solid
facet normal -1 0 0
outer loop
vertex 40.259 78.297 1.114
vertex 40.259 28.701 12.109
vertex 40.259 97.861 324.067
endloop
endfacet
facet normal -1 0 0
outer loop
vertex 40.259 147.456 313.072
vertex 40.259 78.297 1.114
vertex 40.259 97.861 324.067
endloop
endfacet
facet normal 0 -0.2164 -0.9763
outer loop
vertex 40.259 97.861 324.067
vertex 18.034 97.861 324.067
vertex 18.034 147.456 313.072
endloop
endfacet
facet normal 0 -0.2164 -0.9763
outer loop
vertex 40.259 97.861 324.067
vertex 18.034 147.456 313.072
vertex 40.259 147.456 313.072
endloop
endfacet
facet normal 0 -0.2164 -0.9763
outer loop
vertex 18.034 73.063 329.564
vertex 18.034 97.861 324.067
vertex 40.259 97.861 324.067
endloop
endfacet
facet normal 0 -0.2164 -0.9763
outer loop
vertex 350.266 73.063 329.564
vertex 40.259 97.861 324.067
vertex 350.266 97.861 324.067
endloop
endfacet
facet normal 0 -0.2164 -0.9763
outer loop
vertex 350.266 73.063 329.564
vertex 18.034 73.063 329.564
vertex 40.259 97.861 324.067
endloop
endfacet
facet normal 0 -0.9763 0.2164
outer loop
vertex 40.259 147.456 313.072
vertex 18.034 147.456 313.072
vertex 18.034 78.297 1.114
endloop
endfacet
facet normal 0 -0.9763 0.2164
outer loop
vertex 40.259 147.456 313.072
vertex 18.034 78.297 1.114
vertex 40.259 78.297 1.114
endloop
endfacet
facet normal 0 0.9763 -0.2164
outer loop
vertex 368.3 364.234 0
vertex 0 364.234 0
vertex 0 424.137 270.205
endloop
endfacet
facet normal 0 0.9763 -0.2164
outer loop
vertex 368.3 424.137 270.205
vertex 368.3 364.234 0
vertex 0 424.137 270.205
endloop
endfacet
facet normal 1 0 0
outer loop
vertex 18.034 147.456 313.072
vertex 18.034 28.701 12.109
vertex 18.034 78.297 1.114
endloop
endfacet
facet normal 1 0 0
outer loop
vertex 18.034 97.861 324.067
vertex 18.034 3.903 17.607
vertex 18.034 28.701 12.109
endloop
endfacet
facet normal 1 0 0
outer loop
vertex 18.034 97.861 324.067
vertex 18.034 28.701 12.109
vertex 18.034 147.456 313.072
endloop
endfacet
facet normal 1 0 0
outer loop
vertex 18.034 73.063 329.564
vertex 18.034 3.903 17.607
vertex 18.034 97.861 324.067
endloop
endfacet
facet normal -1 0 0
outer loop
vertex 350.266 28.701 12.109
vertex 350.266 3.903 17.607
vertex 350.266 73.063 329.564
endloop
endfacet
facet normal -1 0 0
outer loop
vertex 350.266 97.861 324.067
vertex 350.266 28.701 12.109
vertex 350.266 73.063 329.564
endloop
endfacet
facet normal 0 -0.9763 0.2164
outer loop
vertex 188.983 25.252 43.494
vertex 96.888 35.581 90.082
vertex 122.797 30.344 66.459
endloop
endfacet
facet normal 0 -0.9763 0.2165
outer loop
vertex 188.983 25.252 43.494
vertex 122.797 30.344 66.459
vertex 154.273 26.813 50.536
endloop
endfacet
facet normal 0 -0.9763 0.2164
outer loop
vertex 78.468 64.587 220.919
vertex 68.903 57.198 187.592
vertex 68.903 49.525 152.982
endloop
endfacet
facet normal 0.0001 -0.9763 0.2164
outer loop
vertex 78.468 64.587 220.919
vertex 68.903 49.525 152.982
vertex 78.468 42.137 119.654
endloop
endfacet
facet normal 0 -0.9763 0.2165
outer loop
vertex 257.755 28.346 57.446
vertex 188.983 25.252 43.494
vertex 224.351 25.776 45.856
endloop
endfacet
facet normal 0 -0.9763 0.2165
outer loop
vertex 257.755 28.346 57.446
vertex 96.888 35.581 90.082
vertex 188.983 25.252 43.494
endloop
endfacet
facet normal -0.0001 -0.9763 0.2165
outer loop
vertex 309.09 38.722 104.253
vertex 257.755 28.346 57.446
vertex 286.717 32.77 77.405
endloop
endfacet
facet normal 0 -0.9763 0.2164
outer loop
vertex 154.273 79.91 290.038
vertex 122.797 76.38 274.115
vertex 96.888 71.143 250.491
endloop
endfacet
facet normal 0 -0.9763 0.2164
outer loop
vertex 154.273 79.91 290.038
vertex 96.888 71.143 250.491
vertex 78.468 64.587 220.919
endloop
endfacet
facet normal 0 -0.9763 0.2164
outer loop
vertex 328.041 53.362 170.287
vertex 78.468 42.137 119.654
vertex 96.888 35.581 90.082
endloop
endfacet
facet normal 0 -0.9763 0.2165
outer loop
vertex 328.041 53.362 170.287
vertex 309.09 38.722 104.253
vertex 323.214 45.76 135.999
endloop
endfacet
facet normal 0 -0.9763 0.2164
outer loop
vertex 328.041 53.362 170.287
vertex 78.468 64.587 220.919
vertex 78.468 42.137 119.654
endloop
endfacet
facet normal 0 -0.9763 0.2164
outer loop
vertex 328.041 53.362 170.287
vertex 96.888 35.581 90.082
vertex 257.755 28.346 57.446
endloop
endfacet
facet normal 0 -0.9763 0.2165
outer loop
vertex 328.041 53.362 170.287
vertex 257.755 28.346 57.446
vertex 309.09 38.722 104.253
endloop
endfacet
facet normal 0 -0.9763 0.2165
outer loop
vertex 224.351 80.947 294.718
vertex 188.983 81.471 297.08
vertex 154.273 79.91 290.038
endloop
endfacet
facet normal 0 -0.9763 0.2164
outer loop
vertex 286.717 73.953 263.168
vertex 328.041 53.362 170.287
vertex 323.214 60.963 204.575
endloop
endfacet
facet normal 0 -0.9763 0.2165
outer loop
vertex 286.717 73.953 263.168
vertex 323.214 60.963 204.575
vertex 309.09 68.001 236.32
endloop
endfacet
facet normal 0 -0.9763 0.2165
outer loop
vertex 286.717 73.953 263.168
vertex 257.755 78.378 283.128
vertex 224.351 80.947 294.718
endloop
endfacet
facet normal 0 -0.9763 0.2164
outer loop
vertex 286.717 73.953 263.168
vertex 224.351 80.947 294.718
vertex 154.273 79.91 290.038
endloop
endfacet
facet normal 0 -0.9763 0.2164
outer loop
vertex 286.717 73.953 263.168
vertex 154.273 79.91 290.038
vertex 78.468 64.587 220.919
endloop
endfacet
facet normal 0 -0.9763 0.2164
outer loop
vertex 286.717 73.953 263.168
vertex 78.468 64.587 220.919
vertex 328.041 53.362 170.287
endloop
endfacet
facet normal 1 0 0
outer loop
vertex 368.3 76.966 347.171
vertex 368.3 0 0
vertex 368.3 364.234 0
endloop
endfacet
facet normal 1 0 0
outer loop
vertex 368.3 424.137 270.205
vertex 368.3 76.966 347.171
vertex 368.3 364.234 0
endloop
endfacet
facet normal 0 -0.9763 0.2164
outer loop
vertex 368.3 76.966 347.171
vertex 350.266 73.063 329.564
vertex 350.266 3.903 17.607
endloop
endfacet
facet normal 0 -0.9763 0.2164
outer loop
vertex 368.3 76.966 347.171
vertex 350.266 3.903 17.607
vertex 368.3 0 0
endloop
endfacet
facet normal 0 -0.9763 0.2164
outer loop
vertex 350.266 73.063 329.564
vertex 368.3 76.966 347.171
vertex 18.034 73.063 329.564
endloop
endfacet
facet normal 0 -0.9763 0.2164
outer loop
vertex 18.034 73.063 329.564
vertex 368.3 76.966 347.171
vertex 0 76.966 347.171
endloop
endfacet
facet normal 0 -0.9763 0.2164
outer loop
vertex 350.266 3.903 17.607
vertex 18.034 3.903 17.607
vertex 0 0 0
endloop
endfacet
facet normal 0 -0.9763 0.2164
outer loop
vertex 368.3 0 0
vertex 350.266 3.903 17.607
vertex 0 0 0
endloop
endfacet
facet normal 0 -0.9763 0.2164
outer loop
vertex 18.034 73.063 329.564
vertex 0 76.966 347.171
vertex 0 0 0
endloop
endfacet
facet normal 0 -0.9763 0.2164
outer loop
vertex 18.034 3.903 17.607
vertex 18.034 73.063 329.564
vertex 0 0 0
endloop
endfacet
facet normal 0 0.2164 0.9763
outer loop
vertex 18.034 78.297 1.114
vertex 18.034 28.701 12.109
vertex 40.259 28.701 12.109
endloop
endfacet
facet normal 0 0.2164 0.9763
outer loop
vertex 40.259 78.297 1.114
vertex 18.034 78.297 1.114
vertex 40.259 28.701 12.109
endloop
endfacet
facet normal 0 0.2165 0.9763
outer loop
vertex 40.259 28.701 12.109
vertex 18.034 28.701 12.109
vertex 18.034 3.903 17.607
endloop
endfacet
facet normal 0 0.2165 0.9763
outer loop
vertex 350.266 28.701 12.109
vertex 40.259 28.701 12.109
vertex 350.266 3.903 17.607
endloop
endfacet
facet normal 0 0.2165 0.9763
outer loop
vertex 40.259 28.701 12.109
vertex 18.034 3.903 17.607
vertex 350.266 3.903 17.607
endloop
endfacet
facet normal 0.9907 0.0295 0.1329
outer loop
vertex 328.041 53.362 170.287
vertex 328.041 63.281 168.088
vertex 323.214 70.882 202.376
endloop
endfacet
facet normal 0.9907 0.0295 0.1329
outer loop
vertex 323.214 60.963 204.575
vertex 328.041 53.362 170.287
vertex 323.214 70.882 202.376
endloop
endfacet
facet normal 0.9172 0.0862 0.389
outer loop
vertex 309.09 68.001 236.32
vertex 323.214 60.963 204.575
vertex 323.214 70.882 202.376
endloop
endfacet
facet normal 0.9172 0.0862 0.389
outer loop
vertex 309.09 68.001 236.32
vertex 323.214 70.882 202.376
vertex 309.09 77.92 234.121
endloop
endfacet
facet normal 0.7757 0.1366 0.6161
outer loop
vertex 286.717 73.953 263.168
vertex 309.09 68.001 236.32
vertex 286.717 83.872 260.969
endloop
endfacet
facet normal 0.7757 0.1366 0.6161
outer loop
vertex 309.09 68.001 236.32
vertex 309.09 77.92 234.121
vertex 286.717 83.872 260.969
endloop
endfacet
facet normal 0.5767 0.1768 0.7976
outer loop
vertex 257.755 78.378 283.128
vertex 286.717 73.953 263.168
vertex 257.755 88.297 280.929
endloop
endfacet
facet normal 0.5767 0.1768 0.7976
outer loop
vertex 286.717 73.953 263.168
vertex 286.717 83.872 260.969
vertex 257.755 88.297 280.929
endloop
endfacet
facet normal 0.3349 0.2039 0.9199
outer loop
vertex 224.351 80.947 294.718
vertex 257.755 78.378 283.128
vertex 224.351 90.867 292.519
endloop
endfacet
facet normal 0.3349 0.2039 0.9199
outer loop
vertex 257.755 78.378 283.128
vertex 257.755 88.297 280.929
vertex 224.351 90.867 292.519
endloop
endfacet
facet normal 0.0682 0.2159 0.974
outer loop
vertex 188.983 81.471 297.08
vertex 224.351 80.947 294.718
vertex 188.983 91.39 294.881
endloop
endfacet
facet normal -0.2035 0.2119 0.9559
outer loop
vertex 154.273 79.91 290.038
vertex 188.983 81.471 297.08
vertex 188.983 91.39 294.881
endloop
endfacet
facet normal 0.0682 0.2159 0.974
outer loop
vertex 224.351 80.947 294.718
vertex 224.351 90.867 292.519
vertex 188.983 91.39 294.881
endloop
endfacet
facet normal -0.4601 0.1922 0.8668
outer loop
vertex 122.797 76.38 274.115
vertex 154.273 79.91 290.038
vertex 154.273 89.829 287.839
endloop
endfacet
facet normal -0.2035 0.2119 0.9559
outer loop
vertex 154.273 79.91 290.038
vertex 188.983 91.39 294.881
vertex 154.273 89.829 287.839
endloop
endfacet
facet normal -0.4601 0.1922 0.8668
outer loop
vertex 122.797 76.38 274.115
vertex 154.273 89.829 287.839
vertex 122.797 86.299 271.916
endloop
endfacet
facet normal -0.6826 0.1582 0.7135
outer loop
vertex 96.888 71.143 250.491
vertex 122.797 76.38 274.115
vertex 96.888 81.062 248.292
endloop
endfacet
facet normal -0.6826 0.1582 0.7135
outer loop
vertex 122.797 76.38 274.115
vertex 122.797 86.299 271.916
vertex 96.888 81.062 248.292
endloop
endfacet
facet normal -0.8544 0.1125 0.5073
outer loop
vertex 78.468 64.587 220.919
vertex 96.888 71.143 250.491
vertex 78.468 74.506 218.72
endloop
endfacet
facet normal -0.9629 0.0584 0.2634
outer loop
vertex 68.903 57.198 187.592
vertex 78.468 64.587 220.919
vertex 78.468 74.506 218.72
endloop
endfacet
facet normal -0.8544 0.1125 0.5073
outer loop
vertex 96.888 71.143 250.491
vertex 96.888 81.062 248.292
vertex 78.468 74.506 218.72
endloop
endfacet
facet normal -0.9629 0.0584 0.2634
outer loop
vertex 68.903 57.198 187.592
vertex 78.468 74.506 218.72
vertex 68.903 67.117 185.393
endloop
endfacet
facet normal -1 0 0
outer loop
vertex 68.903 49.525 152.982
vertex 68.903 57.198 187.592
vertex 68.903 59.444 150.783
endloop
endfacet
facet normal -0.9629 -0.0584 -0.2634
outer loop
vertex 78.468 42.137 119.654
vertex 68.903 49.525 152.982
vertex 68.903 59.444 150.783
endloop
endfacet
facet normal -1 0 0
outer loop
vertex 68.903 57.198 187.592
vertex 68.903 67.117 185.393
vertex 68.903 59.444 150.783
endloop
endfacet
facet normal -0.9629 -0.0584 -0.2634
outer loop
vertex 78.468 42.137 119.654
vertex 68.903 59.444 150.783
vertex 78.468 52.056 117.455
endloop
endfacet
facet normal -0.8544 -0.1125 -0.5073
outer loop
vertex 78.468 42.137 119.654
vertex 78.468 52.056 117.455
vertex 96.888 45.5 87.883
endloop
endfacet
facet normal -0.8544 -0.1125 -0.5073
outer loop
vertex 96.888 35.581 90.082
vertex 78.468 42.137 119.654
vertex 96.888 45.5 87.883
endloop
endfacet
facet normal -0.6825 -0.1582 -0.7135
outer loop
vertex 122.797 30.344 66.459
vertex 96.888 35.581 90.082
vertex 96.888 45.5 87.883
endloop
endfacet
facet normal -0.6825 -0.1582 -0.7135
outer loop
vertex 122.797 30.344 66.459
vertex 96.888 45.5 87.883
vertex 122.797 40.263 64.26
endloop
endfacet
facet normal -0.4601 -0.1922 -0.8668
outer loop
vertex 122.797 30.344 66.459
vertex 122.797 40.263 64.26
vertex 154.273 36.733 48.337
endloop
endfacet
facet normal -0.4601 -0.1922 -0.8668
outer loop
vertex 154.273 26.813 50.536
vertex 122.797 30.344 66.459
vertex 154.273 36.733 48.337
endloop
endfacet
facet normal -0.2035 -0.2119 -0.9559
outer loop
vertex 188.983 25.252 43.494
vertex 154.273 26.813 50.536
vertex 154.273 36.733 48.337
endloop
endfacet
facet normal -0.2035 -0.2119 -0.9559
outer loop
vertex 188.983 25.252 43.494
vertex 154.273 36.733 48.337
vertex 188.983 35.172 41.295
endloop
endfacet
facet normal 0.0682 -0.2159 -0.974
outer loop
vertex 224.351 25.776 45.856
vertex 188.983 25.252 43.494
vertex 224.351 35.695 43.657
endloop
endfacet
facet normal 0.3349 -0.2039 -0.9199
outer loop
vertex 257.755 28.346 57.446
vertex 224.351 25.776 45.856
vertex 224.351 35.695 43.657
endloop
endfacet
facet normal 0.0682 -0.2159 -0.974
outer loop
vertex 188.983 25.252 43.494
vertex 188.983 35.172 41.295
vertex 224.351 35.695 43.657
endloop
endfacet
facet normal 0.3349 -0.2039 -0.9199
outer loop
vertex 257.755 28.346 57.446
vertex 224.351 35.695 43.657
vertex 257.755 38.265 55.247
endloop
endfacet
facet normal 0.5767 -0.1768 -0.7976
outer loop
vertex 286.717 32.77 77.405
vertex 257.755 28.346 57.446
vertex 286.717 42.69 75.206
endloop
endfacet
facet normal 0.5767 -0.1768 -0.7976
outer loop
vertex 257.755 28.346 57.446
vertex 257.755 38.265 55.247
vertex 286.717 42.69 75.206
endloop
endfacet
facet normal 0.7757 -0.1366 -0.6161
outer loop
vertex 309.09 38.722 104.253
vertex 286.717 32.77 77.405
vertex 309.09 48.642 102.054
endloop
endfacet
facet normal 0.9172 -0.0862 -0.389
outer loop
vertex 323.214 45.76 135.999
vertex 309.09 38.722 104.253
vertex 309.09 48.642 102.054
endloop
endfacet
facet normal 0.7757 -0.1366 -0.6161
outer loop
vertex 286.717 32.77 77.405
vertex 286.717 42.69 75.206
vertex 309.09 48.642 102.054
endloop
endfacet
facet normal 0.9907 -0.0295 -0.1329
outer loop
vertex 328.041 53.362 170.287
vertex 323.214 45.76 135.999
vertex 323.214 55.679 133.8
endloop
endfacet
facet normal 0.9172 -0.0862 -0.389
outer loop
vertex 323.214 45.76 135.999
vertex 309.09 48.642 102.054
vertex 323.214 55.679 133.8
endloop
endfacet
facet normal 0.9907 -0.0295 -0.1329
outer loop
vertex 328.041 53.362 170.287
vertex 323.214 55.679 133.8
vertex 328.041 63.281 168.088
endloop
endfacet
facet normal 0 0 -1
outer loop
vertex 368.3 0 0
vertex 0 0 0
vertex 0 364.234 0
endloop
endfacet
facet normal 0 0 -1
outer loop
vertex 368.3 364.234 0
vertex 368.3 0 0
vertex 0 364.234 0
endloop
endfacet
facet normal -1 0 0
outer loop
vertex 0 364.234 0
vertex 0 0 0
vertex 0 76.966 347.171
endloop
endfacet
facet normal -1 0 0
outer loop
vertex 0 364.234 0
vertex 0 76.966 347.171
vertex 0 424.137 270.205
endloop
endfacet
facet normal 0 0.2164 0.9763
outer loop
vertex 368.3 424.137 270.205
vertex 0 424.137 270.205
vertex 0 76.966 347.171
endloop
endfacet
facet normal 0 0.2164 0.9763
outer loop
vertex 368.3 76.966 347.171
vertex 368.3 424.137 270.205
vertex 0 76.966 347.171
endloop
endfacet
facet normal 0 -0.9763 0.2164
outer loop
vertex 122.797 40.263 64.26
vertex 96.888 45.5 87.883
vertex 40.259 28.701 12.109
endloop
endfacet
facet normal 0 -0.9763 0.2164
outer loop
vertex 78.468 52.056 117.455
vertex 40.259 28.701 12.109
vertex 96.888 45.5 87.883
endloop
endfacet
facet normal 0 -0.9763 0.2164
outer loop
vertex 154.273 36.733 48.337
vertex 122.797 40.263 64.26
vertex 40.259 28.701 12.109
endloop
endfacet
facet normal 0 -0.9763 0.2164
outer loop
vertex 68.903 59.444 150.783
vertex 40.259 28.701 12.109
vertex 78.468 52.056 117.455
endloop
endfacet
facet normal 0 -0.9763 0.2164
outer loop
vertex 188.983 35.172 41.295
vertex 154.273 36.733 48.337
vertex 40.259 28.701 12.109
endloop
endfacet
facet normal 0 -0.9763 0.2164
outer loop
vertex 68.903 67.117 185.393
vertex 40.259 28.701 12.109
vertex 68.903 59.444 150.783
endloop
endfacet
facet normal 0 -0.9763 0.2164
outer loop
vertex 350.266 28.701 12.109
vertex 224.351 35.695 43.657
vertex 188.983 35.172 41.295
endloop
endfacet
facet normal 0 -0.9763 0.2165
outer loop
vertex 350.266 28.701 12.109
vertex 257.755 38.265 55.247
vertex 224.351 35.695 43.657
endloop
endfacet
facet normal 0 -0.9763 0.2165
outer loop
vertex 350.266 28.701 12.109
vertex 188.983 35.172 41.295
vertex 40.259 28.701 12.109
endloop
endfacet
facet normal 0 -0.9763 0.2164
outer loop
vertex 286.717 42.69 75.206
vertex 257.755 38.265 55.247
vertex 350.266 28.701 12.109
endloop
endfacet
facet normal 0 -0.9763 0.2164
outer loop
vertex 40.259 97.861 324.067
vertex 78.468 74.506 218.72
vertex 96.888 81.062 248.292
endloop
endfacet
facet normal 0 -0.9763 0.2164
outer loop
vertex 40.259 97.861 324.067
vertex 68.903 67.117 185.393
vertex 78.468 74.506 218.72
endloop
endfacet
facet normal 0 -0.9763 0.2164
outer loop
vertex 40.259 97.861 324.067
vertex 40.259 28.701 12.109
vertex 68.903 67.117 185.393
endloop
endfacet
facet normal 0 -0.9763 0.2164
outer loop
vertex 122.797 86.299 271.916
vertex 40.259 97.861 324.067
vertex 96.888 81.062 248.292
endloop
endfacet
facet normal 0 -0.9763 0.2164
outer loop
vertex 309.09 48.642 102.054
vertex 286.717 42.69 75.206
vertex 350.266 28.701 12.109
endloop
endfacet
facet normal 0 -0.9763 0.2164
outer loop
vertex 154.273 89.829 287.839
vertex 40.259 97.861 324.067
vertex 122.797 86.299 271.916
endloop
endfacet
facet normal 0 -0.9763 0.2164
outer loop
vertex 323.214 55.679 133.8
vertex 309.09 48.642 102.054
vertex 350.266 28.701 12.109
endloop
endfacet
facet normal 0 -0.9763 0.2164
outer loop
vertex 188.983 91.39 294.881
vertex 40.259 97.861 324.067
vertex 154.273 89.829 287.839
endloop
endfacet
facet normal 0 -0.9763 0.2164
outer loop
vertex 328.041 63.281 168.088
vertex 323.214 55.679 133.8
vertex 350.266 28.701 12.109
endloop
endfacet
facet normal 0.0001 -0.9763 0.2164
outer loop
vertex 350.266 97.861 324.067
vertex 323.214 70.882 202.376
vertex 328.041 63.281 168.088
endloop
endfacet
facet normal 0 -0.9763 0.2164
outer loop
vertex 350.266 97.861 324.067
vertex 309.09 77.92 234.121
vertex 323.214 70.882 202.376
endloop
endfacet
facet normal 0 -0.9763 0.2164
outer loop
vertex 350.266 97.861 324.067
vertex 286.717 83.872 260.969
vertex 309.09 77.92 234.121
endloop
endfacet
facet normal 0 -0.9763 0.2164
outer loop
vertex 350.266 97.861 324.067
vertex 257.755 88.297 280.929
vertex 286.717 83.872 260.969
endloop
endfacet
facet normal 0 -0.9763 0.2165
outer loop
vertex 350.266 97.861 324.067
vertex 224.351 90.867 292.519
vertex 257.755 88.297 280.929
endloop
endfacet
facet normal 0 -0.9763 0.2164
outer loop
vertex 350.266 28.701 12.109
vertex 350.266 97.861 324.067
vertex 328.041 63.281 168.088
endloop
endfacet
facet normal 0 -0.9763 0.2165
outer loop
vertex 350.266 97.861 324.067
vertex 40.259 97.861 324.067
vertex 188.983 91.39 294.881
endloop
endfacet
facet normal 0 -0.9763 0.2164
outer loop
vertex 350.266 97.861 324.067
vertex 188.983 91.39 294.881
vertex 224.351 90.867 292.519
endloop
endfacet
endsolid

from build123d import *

# Parameters (mm, degrees)
F1_DEPTH = 368.3
F2_W     = 332.232
F2_H     = 319.532
F3_DEPTH = 25.4
F4_R     = 130.175
F5_DEPTH = 10.16
F6_W     = 22.225
F6_H     = 319.532
F7_DEPTH = 50.8


with BuildPart() as f1:
    # F0 (on Right) → F1 (new body)
    with BuildSketch(Plane.YZ):
        Polygon((76.9659267164, 347.1708601318), (0, 0), (364.2337952902, 0), (424.1367868482, 270.2049334155), align=None)
    extrude(amount=F1_DEPTH)

    # F2 (on face) → F3 (cut)
    with BuildSketch(Plane(origin=(0, 0, 0), x_dir=(1, 0, 0), z_dir=(0, -0.9762960071, 0.2164396139))):
        with Locations((184.15, 177.8)):
            Rectangle(F2_W, F2_H)
    extrude(amount=-F3_DEPTH, mode=Mode.SUBTRACT)

    # F4 (on face) → F5 (join)
    with BuildSketch(Plane(origin=(0, 24.7979185808, -5.497566194), x_dir=(1, 0, 0), z_dir=(0, -0.9762960071, 0.2164396139))):
        with Locations((197.866, 177.8)):
            Circle(F4_R)
    extrude(amount=F5_DEPTH)

    # F6 (on face) → F7 (cut)
    with BuildSketch(Plane(origin=(0, 24.7979185808, -5.497566194), x_dir=(1, 0, 0), z_dir=(0, -0.9762960071, 0.2164396139))):
        with Locations((29.1465, 177.8)):
            Rectangle(F6_W, F6_H)
    extrude(amount=-F7_DEPTH, mode=Mode.SUBTRACT)


solid = f1.part
